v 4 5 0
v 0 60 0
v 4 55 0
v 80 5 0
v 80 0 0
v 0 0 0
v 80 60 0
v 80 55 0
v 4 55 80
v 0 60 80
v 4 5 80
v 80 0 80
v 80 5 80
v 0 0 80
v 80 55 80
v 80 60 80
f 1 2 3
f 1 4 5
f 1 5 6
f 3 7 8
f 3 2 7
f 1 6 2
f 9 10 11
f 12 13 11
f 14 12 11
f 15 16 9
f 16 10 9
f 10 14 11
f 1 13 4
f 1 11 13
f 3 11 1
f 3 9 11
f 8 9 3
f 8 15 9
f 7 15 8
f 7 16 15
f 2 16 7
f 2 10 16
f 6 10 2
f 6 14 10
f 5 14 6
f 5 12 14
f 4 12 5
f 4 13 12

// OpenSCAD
$fn = 32;

// ----------------------------------------------------------------------
// Structural section: channel 80 x 60 mm
// ----------------------------------------------------------------------

// --- parameters (mm) ---
sec_w = 80;               // channel width, X
sec_h = 60;               // channel height, Y
flange_t = 5;             // flange thickness
web_t = 4;                // web thickness
plate_t = 80;             // cut length, Z (extrusion height)

profile = [[0, 0], [80, 0], [80, 5], [4, 5], [4, 55], [80, 55], [80, 60], [0, 60]];  // primary outline, 8 points, counter clockwise

// --- the one profile operation ---
linear_extrude(height = plate_t) polygon(points = profile);
